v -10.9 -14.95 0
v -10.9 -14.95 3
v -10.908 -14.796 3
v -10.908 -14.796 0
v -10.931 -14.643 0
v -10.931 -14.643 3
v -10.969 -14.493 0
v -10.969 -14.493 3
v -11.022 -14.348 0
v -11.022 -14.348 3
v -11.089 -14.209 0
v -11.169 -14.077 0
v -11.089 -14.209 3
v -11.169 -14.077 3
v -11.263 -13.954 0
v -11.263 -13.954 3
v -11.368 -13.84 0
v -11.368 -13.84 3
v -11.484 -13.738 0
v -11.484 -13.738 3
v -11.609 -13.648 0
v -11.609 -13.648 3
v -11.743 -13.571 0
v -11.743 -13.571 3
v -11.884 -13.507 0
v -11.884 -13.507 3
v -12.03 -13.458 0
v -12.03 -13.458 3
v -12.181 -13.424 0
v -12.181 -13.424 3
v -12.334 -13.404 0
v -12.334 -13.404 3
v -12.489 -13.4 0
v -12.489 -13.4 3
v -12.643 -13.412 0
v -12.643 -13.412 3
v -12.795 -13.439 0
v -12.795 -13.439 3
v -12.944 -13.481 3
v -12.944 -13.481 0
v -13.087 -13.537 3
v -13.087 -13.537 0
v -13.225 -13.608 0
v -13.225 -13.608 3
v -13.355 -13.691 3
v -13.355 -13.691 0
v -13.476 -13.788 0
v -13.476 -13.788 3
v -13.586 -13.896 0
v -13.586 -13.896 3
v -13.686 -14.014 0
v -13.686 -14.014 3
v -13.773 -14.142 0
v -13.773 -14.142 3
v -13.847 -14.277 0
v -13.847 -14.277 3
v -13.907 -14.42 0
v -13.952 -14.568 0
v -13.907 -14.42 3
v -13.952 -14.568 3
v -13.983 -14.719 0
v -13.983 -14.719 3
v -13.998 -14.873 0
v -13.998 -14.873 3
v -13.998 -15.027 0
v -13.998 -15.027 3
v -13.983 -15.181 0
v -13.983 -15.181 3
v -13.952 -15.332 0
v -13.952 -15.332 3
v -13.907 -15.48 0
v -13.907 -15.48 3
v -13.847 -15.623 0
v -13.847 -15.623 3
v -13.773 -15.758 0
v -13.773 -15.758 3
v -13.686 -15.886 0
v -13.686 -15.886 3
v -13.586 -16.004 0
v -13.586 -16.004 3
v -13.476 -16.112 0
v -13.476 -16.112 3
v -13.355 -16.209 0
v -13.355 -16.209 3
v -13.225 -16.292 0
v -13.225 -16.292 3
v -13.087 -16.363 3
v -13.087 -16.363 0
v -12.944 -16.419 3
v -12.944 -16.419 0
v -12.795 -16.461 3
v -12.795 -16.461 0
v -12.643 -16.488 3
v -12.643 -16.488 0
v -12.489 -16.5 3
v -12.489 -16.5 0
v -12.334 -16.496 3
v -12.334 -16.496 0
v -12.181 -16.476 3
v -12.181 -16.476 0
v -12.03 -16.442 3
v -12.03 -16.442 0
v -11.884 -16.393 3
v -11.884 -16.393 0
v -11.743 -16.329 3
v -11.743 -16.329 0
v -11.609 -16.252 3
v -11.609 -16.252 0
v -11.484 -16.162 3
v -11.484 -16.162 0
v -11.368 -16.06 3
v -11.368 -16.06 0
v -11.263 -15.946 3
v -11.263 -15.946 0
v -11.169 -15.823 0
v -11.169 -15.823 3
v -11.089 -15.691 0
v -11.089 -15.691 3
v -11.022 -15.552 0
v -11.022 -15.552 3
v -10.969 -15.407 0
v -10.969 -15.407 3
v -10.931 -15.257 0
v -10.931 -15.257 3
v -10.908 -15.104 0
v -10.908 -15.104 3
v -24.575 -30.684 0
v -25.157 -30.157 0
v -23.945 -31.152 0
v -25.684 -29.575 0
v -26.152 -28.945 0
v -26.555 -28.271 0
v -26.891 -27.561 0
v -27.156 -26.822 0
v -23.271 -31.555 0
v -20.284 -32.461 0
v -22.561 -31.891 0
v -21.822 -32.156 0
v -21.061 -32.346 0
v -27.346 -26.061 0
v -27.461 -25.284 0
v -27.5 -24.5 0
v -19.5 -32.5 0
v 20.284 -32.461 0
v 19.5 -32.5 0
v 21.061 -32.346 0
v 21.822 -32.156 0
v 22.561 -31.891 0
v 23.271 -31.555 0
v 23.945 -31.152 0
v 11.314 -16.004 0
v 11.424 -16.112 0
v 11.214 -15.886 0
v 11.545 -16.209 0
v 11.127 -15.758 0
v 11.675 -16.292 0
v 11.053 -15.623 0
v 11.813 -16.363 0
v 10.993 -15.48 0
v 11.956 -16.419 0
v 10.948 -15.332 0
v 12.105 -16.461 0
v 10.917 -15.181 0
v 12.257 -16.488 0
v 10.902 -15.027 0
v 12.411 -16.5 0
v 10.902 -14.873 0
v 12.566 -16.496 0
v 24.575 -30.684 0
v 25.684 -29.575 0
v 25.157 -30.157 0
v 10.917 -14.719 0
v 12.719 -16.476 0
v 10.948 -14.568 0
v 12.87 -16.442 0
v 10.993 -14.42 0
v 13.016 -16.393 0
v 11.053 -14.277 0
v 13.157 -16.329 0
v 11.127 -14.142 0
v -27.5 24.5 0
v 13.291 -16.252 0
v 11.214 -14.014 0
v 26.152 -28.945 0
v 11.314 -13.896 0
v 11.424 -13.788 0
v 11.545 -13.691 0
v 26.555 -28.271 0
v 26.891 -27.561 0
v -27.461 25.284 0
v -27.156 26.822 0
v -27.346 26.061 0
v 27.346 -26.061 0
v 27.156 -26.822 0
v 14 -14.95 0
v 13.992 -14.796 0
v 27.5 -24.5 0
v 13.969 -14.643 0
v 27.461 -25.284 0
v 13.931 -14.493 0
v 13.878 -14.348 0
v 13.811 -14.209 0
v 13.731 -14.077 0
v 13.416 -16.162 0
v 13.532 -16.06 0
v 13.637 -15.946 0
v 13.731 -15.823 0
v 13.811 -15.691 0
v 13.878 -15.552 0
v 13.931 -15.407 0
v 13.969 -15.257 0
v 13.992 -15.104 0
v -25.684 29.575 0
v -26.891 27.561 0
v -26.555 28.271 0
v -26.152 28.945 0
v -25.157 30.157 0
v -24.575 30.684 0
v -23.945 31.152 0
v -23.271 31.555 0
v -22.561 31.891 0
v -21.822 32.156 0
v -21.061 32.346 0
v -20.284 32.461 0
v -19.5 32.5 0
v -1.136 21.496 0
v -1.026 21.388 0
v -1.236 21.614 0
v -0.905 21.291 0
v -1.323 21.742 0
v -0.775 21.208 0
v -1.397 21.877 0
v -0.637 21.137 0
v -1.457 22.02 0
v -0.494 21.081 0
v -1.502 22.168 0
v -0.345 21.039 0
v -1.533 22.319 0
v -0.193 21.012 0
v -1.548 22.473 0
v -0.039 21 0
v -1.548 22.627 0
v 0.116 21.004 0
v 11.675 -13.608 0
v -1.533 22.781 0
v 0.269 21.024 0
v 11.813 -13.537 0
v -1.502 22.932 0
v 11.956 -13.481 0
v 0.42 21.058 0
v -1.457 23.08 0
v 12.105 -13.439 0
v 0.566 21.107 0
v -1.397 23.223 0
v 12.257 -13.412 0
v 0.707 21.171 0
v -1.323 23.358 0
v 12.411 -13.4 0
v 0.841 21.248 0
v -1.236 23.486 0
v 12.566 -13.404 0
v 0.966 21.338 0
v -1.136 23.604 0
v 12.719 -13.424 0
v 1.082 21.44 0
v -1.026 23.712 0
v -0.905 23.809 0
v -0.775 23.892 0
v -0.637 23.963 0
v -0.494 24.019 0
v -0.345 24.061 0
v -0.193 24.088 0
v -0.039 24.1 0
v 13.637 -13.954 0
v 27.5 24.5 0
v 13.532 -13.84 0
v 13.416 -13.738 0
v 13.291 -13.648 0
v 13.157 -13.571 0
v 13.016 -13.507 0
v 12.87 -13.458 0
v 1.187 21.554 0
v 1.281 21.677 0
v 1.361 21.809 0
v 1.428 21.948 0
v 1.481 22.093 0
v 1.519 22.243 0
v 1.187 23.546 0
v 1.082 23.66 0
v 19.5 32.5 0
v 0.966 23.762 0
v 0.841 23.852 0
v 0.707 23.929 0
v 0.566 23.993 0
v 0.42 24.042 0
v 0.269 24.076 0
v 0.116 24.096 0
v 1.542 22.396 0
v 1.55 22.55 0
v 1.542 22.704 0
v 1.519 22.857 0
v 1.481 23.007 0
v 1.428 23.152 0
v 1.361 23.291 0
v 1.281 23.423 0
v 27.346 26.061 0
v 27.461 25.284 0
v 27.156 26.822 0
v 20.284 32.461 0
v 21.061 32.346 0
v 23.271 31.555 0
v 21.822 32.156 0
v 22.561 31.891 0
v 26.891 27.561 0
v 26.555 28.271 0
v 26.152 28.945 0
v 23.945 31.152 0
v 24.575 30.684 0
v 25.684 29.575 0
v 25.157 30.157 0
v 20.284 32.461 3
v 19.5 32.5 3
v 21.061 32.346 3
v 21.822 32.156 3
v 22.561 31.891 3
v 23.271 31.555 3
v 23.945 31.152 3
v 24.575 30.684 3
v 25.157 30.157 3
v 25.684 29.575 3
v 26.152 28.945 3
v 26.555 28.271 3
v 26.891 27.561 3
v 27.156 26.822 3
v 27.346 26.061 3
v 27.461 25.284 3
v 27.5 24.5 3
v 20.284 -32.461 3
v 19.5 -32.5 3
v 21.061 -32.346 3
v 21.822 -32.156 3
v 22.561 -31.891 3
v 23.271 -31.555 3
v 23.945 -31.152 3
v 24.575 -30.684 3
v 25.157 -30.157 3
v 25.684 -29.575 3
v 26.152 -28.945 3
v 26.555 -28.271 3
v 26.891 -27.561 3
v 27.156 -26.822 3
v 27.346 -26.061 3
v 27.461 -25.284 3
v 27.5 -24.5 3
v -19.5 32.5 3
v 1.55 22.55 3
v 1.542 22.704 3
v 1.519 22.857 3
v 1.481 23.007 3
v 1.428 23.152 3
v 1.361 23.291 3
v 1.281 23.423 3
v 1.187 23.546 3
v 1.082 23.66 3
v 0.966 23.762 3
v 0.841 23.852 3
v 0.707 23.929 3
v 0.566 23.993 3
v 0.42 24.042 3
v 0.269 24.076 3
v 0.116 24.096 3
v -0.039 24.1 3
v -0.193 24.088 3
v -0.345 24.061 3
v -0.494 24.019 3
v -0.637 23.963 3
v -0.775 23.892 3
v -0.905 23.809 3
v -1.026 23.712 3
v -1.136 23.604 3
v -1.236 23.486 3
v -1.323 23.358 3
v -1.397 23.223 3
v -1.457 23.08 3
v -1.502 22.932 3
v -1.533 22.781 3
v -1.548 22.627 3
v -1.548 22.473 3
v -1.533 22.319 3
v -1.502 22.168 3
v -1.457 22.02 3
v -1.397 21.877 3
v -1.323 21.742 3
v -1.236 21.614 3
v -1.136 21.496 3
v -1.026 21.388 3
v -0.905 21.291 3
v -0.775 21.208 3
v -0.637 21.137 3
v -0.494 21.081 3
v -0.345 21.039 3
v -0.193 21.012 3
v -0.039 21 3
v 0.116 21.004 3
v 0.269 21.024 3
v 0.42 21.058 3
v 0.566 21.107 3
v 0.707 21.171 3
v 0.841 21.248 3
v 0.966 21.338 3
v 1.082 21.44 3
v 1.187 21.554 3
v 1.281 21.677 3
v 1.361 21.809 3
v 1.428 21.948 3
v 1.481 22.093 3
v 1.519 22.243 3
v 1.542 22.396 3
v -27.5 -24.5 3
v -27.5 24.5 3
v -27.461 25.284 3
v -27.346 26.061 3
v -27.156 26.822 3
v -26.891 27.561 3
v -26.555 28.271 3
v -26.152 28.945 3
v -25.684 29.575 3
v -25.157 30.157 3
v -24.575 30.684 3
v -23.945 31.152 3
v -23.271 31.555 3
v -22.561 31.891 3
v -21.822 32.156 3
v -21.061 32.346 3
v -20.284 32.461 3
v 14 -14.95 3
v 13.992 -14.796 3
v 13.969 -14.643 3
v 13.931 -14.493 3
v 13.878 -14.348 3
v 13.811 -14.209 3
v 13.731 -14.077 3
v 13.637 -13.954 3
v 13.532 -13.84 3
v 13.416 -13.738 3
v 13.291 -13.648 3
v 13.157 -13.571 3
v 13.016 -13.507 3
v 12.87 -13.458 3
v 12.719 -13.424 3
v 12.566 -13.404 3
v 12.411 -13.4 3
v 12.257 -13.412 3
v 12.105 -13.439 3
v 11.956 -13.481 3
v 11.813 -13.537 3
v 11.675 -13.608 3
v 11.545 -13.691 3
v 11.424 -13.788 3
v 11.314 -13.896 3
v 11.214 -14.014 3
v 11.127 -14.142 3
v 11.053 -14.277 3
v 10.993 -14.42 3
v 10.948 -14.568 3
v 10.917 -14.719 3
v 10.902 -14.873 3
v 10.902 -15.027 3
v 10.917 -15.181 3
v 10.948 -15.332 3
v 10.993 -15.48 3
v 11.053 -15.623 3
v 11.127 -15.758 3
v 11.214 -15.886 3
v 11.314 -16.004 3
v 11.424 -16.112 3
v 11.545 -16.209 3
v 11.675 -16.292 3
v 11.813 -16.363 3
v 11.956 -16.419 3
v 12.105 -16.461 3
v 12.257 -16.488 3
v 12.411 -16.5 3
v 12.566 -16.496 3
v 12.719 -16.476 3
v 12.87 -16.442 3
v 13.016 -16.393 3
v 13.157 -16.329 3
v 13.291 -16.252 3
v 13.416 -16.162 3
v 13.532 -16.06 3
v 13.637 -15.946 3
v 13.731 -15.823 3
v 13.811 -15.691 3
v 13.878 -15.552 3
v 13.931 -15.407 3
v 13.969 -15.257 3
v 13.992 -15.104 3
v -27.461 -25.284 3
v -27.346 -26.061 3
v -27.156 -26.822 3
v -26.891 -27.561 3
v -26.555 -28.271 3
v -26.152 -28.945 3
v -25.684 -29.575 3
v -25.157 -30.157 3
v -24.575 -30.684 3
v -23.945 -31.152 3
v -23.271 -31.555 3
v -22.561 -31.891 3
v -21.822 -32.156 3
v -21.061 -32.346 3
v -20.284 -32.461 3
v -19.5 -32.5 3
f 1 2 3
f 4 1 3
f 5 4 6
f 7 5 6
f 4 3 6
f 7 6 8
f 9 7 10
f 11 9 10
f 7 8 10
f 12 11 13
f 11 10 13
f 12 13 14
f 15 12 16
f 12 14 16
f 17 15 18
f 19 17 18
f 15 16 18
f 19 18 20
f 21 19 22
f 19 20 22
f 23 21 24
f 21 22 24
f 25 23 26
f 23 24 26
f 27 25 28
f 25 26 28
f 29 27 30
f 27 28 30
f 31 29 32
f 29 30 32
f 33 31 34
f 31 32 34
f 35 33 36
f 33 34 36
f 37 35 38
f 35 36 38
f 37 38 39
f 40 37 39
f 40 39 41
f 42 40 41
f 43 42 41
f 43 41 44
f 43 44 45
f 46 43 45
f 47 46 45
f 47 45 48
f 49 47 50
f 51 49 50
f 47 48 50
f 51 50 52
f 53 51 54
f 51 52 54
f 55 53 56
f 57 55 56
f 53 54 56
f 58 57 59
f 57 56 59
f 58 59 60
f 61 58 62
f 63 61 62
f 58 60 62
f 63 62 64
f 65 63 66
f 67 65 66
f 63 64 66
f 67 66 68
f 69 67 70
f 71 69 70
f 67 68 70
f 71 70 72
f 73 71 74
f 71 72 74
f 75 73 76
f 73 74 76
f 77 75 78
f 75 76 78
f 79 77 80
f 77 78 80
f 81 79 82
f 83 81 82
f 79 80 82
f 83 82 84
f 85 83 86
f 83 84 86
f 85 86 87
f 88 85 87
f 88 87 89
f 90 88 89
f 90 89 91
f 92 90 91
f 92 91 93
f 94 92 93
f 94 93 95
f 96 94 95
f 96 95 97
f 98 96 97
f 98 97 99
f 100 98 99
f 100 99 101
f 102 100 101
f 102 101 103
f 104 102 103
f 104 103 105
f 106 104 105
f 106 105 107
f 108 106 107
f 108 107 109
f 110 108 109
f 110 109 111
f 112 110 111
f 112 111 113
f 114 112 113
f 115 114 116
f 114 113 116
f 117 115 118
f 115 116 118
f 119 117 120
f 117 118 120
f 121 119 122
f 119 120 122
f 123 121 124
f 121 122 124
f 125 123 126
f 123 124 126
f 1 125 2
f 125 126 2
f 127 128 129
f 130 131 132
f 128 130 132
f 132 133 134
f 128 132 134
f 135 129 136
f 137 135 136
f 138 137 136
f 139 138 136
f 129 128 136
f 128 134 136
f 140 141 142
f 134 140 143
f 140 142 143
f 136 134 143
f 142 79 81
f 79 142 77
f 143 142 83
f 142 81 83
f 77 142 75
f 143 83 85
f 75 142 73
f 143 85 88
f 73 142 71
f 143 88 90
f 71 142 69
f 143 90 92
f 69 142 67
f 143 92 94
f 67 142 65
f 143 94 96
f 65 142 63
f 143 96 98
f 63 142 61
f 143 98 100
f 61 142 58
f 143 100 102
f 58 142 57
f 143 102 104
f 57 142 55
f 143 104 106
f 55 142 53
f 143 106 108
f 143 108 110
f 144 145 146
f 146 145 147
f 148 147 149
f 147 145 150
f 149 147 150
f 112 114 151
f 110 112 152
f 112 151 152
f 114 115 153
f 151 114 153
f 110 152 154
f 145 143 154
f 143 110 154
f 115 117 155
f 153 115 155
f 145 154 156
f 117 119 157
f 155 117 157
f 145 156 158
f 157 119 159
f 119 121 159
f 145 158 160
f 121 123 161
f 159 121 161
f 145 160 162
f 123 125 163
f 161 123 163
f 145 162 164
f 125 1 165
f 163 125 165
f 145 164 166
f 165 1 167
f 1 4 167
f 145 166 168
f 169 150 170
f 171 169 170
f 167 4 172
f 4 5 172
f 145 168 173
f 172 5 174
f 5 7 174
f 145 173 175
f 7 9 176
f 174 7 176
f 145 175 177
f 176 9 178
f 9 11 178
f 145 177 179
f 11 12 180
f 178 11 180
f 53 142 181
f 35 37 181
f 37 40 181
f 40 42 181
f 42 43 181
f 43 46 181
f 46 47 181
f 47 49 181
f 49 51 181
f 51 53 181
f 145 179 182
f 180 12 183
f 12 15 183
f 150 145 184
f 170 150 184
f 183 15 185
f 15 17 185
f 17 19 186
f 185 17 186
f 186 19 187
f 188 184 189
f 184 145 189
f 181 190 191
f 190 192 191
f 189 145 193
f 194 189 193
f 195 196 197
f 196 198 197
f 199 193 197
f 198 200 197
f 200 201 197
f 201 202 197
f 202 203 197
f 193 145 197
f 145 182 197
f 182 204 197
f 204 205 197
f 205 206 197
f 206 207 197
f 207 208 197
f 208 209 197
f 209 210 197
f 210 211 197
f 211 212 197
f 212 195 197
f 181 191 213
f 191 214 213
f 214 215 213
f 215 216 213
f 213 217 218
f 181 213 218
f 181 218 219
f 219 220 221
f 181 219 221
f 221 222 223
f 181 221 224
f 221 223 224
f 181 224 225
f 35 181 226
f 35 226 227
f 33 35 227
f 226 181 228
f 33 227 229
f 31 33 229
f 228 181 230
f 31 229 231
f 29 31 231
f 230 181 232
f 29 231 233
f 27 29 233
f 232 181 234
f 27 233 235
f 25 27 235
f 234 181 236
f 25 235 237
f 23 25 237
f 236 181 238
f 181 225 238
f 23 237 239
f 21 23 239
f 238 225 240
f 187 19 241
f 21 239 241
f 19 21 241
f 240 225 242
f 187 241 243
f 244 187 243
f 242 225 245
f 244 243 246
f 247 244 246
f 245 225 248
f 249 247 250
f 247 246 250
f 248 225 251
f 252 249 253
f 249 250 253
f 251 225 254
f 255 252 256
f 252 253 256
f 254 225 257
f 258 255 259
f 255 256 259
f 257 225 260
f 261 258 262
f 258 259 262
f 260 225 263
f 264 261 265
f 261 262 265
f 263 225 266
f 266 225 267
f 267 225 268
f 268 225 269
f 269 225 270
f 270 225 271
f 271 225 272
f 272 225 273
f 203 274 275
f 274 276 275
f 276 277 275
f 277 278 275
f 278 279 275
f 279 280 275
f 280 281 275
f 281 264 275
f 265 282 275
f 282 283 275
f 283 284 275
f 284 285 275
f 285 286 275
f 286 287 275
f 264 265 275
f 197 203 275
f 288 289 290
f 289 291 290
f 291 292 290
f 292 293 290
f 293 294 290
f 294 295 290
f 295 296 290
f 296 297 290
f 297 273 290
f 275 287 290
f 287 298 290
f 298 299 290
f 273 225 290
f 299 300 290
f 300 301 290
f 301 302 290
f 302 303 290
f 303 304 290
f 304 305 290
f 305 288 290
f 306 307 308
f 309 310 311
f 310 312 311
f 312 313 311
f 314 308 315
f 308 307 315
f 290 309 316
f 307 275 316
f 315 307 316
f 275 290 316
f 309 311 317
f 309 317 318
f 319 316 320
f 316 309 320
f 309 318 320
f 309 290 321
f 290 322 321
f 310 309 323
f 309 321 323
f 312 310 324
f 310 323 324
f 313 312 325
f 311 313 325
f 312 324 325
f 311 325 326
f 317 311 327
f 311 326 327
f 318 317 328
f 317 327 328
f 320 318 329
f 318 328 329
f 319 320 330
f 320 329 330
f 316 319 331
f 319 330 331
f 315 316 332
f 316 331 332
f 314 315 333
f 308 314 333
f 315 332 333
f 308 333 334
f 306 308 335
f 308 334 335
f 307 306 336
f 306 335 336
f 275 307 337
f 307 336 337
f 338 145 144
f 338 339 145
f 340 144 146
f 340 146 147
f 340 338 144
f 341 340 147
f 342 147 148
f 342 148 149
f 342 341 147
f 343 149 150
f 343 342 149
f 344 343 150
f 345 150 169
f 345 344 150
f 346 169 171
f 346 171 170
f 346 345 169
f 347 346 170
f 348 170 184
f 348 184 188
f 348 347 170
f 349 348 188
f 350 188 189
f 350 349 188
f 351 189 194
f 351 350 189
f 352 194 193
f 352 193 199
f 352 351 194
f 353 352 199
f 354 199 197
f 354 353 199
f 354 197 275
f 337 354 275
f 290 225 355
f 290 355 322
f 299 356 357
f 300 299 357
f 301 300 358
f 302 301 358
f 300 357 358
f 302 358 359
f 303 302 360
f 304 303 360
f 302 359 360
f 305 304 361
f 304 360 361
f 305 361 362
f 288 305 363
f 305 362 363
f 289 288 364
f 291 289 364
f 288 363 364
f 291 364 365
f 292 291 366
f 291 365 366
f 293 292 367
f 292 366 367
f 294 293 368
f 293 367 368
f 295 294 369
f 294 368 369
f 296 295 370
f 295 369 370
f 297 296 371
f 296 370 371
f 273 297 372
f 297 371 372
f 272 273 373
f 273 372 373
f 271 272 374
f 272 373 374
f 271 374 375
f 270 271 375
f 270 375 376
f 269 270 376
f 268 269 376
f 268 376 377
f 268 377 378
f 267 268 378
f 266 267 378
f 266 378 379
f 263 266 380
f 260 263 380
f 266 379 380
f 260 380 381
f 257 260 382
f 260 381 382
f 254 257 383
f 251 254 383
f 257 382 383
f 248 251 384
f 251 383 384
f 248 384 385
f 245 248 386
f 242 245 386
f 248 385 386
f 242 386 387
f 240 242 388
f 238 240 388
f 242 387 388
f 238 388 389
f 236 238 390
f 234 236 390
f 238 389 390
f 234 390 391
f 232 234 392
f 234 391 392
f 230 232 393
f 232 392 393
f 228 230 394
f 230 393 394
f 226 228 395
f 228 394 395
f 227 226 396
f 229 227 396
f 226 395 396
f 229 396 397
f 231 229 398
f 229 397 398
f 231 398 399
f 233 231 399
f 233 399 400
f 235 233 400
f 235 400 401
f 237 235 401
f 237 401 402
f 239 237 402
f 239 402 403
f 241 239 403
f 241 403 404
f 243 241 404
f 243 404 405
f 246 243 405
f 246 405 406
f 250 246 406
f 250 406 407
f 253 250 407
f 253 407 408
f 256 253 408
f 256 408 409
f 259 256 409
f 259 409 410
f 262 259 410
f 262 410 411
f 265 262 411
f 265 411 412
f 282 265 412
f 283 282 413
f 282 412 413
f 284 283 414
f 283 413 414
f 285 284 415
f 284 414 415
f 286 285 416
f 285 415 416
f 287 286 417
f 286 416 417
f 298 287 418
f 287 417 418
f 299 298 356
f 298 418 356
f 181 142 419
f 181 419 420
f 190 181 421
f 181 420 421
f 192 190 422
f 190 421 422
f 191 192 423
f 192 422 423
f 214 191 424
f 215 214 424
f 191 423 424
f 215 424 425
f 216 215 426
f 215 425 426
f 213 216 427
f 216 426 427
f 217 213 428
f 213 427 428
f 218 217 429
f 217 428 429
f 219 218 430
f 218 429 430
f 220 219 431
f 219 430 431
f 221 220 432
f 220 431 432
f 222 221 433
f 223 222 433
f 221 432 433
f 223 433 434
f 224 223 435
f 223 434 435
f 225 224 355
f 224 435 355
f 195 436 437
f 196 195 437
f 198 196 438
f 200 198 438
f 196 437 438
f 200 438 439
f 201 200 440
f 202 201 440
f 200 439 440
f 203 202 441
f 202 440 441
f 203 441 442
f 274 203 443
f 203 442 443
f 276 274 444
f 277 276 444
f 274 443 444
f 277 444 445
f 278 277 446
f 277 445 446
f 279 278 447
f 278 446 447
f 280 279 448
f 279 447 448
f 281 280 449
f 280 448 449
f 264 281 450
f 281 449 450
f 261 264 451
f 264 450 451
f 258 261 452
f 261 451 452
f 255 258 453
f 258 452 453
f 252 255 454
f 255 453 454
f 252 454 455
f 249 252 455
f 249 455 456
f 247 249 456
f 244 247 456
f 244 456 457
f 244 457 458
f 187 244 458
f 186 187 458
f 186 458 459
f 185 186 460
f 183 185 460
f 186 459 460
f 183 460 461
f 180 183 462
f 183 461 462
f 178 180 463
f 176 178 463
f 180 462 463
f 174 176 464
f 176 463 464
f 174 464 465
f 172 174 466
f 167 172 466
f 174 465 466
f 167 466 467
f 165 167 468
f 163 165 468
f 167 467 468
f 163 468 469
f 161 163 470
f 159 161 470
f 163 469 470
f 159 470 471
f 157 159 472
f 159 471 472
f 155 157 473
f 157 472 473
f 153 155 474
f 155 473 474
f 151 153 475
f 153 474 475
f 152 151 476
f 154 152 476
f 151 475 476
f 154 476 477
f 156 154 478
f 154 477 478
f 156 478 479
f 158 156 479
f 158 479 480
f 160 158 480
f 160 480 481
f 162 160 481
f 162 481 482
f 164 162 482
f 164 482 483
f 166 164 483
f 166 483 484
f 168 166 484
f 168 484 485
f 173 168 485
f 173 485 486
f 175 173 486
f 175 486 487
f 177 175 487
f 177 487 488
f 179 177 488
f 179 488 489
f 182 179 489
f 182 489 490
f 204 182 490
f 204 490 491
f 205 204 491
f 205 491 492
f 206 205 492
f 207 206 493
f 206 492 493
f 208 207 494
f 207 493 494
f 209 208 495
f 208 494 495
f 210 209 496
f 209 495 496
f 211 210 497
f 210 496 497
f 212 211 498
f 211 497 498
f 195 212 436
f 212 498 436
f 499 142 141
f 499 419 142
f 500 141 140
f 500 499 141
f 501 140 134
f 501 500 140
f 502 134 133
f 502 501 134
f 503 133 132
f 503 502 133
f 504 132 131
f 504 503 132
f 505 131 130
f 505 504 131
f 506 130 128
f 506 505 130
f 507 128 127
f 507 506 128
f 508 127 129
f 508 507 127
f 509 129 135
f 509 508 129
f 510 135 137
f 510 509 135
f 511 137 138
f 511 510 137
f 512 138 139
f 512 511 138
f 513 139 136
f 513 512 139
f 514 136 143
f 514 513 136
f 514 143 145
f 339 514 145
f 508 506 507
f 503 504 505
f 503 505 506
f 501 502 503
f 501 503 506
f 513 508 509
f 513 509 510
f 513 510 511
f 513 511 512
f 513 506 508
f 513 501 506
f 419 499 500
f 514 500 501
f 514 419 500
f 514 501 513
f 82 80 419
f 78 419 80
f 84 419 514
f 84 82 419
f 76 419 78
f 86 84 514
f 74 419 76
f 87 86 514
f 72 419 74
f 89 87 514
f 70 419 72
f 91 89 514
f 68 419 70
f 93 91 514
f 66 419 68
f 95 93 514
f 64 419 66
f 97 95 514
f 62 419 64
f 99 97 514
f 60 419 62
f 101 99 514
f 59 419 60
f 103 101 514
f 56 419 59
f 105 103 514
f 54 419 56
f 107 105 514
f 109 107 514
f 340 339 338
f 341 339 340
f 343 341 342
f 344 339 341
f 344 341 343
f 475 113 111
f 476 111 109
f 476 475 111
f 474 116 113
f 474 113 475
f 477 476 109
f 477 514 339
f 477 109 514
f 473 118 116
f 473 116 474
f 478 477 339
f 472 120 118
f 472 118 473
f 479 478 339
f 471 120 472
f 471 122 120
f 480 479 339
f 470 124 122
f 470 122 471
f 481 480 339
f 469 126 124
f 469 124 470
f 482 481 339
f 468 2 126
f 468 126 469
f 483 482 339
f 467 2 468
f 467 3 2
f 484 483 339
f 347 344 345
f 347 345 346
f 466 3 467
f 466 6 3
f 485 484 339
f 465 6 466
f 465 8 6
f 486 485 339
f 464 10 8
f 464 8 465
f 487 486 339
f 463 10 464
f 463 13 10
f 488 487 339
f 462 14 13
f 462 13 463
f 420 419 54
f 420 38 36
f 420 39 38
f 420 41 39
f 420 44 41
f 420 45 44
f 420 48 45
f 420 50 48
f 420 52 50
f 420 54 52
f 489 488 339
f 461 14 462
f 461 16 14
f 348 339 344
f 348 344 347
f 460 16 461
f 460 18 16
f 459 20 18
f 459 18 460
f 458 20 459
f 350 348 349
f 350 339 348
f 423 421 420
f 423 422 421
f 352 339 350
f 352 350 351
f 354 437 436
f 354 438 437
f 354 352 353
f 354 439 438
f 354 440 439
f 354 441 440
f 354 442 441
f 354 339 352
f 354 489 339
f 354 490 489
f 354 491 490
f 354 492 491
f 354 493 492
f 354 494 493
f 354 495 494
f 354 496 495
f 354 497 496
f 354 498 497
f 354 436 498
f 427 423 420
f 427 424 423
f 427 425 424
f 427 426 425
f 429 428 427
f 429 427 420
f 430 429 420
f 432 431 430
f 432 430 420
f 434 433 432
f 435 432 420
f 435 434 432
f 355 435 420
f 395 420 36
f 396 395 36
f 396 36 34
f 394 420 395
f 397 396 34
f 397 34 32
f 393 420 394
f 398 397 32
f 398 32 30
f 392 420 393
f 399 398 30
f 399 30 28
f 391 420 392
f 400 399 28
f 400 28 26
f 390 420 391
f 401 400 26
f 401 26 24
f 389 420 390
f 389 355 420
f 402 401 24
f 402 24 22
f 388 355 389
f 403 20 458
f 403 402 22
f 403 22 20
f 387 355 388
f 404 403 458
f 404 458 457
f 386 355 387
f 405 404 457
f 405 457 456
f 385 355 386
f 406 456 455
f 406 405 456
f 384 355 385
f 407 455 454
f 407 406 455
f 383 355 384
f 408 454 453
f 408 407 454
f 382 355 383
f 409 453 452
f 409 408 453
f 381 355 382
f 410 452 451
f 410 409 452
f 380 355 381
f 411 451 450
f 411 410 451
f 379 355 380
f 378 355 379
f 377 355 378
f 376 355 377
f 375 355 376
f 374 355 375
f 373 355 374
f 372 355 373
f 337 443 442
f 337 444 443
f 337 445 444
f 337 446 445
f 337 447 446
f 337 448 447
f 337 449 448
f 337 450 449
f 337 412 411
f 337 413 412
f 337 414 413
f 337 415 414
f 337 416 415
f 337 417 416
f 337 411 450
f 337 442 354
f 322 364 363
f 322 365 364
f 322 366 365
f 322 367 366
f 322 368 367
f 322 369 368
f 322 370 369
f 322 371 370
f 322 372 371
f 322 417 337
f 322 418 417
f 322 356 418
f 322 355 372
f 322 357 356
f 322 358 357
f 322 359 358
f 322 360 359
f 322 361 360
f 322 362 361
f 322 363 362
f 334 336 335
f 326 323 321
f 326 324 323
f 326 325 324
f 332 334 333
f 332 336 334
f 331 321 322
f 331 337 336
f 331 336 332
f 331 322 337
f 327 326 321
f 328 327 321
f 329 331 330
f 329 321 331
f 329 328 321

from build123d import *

# Parameters (mm, degrees)
F0_W     = 55
F0_H     = 65
F1_DEPTH = 3
F2_R     = 1.55
F3_DEPTH = 3
F4_R     = 8


with BuildPart() as f1:
    # F0 (on Top) → F1 (new body)
    with BuildSketch(Plane.XY):
        Rectangle(F0_W, F0_H)
    extrude(amount=F1_DEPTH)

    # F2 (on face) → F3 (cut, through all)
    with BuildSketch(Plane.XY.offset(3)):
        with Locations((-12.45, -14.95)):
            Circle(F2_R)
        with Locations((12.45, -14.95)):
            Circle(F2_R)
        with Locations((0, 22.55)):
            Circle(F2_R)
    extrude(amount=-F3_DEPTH, mode=Mode.SUBTRACT)

    # F4
    f4_edges = [f1.edges().sort_by_distance(p)[0] for p in [
        (27.5, -32.5, 1.5),
        (-27.5, -32.5, 1.5),
        (-27.5, 32.5, 1.5),
        (27.5, 32.5, 1.5),
    ]]
    fillet(f4_edges, radius=F4_R)


solid = f1.part
